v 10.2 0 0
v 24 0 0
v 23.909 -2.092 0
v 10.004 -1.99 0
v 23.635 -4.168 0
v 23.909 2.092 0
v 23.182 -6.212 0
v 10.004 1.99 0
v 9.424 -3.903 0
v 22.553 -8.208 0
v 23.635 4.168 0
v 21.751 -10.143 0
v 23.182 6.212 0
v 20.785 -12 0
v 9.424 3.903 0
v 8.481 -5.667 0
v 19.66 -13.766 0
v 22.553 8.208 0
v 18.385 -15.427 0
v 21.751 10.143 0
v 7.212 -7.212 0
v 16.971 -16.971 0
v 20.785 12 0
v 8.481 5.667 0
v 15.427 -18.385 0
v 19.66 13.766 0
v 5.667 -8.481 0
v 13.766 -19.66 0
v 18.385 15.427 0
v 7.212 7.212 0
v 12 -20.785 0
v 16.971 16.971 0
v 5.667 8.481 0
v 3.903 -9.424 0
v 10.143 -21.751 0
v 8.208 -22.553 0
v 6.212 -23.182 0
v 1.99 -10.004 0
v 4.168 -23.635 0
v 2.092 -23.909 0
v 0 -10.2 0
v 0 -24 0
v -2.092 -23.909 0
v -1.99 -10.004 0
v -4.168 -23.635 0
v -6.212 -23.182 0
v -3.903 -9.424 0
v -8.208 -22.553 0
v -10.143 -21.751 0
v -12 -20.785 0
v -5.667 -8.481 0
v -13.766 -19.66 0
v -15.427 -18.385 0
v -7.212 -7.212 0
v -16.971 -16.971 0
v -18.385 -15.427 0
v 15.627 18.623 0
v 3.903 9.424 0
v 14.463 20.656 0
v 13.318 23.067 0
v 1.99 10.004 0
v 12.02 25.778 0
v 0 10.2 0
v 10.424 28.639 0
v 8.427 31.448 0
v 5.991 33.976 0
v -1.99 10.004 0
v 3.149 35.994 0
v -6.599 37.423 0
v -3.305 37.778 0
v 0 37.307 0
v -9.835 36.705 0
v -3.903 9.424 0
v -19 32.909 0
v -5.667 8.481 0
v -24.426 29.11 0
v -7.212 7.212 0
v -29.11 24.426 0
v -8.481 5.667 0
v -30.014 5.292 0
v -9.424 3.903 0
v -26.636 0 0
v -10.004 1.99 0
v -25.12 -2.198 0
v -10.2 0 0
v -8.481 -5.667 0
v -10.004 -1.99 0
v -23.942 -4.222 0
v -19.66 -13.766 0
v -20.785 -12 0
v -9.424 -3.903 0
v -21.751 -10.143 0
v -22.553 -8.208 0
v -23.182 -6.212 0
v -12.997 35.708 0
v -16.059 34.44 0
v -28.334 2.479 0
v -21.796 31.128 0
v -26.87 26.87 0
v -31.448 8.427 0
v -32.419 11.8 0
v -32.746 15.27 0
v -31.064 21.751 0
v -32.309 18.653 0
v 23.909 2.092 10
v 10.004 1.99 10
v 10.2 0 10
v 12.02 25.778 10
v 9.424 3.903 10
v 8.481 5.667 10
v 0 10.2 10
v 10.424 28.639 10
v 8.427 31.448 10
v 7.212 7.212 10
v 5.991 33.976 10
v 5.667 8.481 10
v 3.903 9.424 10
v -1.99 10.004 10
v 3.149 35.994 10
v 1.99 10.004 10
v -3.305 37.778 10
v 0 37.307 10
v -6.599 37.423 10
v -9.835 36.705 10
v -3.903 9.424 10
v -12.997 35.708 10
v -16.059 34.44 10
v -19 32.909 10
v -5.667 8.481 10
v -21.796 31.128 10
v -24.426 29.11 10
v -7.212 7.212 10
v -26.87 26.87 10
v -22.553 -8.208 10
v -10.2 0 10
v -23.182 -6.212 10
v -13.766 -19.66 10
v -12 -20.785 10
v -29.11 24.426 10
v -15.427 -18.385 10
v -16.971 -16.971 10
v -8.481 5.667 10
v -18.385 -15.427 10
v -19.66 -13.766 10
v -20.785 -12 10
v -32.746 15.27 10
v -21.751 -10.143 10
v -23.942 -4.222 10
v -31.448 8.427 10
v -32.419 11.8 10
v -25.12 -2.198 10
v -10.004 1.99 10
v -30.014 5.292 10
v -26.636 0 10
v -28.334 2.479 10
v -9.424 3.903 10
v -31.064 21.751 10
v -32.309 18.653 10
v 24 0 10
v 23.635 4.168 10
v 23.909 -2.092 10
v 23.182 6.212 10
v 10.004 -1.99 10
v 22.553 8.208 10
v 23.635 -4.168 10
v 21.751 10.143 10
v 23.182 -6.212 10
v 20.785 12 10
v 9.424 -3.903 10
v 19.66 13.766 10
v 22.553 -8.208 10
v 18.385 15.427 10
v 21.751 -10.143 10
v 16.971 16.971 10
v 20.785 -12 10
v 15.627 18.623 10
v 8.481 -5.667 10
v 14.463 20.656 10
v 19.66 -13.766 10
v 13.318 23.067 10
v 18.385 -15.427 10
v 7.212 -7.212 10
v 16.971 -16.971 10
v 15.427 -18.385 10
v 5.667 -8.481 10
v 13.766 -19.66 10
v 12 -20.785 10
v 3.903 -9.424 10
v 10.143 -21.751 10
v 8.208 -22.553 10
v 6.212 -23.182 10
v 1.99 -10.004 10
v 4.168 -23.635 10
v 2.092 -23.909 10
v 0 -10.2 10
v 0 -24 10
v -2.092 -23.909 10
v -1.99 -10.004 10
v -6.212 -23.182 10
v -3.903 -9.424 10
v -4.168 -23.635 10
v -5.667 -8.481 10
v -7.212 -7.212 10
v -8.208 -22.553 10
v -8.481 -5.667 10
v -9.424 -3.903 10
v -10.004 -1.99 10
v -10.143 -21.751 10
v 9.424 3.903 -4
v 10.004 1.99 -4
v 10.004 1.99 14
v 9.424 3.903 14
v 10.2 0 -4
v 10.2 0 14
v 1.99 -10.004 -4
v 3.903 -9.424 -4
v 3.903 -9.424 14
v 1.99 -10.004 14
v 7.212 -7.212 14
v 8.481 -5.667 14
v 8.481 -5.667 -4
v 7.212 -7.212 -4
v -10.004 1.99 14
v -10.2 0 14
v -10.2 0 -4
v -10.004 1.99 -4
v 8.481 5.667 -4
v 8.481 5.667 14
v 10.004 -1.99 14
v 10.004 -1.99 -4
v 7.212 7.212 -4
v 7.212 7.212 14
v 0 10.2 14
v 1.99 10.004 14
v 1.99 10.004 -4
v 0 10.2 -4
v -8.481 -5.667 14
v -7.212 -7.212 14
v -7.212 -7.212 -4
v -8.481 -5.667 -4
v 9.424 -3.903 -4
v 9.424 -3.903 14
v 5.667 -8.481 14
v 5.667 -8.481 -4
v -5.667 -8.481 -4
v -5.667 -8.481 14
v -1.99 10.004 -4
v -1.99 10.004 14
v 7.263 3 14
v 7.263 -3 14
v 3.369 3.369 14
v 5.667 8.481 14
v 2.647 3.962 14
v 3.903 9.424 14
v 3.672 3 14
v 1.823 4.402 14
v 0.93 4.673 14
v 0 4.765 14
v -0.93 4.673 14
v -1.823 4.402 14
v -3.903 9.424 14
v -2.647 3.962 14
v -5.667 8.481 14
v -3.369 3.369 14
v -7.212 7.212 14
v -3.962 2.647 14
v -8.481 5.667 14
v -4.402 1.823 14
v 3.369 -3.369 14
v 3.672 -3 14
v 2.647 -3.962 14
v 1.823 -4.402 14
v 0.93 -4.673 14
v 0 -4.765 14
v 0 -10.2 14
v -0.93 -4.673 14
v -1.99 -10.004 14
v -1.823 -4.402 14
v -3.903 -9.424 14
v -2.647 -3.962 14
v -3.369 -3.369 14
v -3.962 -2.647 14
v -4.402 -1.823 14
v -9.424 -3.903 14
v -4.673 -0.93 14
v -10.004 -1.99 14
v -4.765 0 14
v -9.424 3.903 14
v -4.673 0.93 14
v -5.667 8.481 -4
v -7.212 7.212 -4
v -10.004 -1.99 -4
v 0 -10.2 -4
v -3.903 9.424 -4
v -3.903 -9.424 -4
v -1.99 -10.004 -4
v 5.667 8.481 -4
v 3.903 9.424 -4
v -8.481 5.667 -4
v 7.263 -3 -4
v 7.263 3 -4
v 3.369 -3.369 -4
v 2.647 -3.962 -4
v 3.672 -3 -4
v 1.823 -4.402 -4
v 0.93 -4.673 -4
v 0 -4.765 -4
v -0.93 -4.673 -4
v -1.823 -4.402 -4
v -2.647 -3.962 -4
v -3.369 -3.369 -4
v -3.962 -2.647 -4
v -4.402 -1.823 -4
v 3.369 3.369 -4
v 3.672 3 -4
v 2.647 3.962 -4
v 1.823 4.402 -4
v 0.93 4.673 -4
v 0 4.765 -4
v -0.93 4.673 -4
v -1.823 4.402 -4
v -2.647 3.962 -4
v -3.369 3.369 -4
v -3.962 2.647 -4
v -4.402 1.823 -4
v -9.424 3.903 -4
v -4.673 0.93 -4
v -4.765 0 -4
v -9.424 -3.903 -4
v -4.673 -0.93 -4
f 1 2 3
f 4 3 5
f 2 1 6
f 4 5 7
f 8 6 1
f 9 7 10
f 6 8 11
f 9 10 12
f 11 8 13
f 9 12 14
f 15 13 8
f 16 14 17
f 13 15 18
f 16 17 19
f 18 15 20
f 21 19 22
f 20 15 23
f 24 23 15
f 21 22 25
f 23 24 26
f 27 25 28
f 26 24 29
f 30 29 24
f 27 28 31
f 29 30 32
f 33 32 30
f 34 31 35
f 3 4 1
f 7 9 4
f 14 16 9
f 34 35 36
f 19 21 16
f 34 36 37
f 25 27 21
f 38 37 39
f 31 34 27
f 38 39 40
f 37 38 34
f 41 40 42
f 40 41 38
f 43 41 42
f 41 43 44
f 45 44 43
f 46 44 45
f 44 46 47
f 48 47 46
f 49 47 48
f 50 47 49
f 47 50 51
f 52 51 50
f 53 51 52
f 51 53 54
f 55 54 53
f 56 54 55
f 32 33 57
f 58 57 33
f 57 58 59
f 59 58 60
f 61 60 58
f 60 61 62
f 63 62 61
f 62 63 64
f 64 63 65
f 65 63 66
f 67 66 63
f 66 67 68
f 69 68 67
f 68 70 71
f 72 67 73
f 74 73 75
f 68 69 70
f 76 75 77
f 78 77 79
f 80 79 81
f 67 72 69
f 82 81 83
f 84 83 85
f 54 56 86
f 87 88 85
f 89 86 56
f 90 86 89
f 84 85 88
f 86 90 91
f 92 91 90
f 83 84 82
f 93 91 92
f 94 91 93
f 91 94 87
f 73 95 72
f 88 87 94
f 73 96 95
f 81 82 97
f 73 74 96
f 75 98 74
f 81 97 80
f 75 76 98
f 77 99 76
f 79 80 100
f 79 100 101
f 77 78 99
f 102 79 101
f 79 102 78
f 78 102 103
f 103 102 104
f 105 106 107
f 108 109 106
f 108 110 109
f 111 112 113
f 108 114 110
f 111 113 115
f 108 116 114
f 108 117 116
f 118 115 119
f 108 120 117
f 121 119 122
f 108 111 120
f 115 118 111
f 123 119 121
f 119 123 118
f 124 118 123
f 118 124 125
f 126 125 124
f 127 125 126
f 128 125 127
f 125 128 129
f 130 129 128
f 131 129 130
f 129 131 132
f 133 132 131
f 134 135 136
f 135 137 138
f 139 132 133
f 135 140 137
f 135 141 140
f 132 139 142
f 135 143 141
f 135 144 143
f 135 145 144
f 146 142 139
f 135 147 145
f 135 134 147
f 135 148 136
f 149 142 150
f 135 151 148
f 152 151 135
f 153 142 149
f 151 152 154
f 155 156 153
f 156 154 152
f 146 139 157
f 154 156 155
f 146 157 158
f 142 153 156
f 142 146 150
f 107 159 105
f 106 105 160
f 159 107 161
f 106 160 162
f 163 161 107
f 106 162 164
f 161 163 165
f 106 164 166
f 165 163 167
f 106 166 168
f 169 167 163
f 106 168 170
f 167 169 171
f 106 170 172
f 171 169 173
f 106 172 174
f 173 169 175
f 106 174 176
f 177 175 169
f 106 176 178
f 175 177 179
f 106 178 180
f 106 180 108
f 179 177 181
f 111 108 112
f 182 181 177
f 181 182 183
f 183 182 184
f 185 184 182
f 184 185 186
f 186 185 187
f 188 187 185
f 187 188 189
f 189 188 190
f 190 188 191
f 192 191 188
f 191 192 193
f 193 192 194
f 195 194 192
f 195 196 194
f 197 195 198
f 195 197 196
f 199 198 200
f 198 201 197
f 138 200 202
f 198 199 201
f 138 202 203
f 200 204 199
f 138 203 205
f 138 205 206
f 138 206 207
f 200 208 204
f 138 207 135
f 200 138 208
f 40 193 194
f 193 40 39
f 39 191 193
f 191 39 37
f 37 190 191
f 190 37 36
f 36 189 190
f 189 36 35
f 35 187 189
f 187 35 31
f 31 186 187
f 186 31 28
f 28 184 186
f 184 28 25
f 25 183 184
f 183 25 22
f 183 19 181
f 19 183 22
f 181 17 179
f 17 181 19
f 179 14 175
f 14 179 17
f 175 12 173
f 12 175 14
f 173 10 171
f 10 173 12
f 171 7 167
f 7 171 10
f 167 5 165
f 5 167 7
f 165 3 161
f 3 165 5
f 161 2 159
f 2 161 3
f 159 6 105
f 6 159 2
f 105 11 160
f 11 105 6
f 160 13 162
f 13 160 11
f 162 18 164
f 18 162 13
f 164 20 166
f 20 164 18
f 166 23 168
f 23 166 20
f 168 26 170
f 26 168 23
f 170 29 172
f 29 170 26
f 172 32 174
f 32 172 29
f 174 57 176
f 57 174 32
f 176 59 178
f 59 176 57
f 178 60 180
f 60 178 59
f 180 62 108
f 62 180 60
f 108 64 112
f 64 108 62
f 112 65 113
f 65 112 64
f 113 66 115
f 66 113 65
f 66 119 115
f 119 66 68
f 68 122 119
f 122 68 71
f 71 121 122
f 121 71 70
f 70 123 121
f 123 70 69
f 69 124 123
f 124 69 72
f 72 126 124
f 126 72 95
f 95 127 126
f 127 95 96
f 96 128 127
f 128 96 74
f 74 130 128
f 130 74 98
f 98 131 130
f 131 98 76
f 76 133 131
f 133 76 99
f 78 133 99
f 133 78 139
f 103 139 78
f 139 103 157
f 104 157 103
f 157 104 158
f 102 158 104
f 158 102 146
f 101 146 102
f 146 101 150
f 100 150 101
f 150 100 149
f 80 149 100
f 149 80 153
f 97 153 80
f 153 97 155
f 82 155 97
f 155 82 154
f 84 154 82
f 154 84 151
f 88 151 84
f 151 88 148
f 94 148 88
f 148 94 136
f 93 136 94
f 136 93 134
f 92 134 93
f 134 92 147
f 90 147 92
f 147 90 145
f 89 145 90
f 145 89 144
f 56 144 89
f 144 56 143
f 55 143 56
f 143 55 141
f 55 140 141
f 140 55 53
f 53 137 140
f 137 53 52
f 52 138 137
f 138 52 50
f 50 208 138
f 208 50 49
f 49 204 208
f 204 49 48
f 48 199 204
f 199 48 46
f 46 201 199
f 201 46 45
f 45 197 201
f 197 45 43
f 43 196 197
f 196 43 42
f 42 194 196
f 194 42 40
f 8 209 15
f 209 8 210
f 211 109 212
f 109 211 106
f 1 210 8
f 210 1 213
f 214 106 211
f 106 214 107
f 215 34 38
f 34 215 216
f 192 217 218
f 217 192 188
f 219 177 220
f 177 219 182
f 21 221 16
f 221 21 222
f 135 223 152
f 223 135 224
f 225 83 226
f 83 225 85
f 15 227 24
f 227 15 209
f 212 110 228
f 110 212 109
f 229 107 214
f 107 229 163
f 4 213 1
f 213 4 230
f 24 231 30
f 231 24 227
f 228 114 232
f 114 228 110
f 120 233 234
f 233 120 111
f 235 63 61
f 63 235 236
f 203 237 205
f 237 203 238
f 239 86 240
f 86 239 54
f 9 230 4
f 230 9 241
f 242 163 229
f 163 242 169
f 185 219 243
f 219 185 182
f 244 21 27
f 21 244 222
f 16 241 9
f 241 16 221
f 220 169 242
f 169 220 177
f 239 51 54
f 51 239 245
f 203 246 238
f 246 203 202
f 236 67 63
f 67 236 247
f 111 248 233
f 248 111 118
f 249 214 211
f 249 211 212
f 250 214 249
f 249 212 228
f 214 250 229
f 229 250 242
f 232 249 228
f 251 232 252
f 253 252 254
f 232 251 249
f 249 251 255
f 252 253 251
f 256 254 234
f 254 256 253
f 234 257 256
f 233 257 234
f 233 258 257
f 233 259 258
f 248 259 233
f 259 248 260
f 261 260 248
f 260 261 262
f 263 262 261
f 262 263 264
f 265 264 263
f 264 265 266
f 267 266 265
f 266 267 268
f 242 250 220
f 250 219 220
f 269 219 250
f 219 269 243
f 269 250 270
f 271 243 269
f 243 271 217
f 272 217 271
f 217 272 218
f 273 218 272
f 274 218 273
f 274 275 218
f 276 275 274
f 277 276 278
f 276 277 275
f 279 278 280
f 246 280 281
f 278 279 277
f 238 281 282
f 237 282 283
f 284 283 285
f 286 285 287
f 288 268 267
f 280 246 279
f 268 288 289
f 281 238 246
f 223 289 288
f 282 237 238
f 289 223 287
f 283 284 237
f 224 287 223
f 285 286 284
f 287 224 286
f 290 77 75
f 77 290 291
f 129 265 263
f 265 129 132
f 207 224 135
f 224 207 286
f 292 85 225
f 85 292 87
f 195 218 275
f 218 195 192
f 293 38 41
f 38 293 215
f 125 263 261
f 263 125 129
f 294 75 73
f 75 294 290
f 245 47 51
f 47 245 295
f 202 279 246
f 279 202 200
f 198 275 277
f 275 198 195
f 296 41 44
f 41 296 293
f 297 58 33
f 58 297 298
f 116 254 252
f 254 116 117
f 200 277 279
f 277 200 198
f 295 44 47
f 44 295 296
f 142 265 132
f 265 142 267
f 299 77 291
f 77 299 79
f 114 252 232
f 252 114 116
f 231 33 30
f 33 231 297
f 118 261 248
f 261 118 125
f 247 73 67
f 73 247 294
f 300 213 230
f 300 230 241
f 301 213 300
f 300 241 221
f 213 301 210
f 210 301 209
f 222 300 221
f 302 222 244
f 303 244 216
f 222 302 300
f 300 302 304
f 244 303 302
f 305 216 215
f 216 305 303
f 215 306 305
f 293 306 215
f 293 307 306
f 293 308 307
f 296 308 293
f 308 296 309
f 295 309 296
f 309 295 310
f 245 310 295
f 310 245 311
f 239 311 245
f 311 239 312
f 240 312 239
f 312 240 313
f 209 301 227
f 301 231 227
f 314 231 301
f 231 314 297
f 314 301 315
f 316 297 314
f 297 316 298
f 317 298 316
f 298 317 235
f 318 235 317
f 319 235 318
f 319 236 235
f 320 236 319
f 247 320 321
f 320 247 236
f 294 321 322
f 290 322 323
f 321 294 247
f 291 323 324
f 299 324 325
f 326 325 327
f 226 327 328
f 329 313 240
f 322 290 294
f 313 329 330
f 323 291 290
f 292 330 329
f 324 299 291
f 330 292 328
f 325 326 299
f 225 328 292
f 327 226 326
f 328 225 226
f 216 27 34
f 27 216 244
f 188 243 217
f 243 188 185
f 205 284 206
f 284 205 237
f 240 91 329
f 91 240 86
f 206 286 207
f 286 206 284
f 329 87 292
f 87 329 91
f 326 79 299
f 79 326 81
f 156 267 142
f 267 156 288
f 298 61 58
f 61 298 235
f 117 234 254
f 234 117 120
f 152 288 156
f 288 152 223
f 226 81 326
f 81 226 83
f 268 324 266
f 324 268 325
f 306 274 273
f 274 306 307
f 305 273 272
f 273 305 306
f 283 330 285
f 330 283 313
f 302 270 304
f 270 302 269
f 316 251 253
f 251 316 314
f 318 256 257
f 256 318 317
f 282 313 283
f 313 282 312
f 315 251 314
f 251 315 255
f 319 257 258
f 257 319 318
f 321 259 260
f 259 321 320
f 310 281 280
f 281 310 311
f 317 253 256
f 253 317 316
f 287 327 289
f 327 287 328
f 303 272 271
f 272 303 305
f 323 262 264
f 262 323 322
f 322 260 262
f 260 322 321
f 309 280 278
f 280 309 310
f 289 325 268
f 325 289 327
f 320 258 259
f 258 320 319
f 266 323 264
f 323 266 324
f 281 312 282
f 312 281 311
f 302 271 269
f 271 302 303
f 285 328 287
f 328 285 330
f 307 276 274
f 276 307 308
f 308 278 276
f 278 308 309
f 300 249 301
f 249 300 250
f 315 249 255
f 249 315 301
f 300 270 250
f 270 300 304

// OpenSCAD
$fn = 32;

// ----------------------------------------------------------------------
// Cam: base radius 24 mm with a 14 mm lift over 150 degrees
// ----------------------------------------------------------------------

// --- parameters (mm) ---
base_r = 24;              // base radius
lift = 14;                // lift height above the base radius
lift_span = 150;          // angular width of the lift
lift_start = 45;          // angle where the lift starts
cam_t = 10;               // cam plate thickness
hub_d = 20.4;             // hub diameter
hub_h = 18;               // hub height
bore_d = 9.53;            // bore
key_w = 6;                // keyway width
key_depth = 3;            // keyway depth

cam_profile = [[24, 0], [23.909, 2.092], [23.635, 4.168], [23.182, 6.212], [22.553, 8.208], [21.751, 10.143], [20.785, 12], [19.66, 13.766], [18.385, 15.427], [16.971, 16.971], [15.627, 18.623], [14.463, 20.656], [13.318, 23.067], [12.02, 25.778], [10.424, 28.639], [8.427, 31.448], [5.991, 33.976], [3.149, 35.994], [0, 37.307], [-3.305, 37.778], [-6.599, 37.423], [-9.835, 36.705], [-12.997, 35.708], [-16.059, 34.44], [-19, 32.909], [-21.796, 31.128], [-24.426, 29.11], [-26.87, 26.87], [-29.11, 24.426], [-31.064, 21.751], [-32.309, 18.653], [-32.746, 15.27], [-32.419, 11.8], [-31.448, 8.427], [-30.014, 5.292], [-28.334, 2.479], [-26.636, 0], [-25.12, -2.198], [-23.942, -4.222], [-23.182, -6.212], [-22.553, -8.208], [-21.751, -10.143], [-20.785, -12], [-19.66, -13.766], [-18.385, -15.427], [-16.971, -16.971], [-15.427, -18.385], [-13.766, -19.66], [-12, -20.785], [-10.143, -21.751], [-8.208, -22.553], [-6.212, -23.182], [-4.168, -23.635], [-2.092, -23.909], [0, -24], [2.092, -23.909], [4.168, -23.635], [6.212, -23.182], [8.208, -22.553], [10.143, -21.751], [12, -20.785], [13.766, -19.66], [15.427, -18.385], [16.971, -16.971], [18.385, -15.427], [19.66, -13.766], [20.785, -12], [21.751, -10.143], [22.553, -8.208], [23.182, -6.212], [23.635, -4.168], [23.909, -2.092]];

difference() {
  union() {
    linear_extrude(height = cam_t) polygon(cam_profile);
    /* hub, proud of the cam plate on both sides */
    translate([0, 0, -4]) cylinder(h = hub_h, d = hub_d);
  }
  /* bore through the hub, 2.5 mm clear on both faces */
  translate([0, 0, -6.5]) cylinder(h = hub_h + 5, d = bore_d);
  /* keyway, milled through the whole hub */
  translate([1.763, -3, -6.5]) cube([5.5, 6, 23]);
}
